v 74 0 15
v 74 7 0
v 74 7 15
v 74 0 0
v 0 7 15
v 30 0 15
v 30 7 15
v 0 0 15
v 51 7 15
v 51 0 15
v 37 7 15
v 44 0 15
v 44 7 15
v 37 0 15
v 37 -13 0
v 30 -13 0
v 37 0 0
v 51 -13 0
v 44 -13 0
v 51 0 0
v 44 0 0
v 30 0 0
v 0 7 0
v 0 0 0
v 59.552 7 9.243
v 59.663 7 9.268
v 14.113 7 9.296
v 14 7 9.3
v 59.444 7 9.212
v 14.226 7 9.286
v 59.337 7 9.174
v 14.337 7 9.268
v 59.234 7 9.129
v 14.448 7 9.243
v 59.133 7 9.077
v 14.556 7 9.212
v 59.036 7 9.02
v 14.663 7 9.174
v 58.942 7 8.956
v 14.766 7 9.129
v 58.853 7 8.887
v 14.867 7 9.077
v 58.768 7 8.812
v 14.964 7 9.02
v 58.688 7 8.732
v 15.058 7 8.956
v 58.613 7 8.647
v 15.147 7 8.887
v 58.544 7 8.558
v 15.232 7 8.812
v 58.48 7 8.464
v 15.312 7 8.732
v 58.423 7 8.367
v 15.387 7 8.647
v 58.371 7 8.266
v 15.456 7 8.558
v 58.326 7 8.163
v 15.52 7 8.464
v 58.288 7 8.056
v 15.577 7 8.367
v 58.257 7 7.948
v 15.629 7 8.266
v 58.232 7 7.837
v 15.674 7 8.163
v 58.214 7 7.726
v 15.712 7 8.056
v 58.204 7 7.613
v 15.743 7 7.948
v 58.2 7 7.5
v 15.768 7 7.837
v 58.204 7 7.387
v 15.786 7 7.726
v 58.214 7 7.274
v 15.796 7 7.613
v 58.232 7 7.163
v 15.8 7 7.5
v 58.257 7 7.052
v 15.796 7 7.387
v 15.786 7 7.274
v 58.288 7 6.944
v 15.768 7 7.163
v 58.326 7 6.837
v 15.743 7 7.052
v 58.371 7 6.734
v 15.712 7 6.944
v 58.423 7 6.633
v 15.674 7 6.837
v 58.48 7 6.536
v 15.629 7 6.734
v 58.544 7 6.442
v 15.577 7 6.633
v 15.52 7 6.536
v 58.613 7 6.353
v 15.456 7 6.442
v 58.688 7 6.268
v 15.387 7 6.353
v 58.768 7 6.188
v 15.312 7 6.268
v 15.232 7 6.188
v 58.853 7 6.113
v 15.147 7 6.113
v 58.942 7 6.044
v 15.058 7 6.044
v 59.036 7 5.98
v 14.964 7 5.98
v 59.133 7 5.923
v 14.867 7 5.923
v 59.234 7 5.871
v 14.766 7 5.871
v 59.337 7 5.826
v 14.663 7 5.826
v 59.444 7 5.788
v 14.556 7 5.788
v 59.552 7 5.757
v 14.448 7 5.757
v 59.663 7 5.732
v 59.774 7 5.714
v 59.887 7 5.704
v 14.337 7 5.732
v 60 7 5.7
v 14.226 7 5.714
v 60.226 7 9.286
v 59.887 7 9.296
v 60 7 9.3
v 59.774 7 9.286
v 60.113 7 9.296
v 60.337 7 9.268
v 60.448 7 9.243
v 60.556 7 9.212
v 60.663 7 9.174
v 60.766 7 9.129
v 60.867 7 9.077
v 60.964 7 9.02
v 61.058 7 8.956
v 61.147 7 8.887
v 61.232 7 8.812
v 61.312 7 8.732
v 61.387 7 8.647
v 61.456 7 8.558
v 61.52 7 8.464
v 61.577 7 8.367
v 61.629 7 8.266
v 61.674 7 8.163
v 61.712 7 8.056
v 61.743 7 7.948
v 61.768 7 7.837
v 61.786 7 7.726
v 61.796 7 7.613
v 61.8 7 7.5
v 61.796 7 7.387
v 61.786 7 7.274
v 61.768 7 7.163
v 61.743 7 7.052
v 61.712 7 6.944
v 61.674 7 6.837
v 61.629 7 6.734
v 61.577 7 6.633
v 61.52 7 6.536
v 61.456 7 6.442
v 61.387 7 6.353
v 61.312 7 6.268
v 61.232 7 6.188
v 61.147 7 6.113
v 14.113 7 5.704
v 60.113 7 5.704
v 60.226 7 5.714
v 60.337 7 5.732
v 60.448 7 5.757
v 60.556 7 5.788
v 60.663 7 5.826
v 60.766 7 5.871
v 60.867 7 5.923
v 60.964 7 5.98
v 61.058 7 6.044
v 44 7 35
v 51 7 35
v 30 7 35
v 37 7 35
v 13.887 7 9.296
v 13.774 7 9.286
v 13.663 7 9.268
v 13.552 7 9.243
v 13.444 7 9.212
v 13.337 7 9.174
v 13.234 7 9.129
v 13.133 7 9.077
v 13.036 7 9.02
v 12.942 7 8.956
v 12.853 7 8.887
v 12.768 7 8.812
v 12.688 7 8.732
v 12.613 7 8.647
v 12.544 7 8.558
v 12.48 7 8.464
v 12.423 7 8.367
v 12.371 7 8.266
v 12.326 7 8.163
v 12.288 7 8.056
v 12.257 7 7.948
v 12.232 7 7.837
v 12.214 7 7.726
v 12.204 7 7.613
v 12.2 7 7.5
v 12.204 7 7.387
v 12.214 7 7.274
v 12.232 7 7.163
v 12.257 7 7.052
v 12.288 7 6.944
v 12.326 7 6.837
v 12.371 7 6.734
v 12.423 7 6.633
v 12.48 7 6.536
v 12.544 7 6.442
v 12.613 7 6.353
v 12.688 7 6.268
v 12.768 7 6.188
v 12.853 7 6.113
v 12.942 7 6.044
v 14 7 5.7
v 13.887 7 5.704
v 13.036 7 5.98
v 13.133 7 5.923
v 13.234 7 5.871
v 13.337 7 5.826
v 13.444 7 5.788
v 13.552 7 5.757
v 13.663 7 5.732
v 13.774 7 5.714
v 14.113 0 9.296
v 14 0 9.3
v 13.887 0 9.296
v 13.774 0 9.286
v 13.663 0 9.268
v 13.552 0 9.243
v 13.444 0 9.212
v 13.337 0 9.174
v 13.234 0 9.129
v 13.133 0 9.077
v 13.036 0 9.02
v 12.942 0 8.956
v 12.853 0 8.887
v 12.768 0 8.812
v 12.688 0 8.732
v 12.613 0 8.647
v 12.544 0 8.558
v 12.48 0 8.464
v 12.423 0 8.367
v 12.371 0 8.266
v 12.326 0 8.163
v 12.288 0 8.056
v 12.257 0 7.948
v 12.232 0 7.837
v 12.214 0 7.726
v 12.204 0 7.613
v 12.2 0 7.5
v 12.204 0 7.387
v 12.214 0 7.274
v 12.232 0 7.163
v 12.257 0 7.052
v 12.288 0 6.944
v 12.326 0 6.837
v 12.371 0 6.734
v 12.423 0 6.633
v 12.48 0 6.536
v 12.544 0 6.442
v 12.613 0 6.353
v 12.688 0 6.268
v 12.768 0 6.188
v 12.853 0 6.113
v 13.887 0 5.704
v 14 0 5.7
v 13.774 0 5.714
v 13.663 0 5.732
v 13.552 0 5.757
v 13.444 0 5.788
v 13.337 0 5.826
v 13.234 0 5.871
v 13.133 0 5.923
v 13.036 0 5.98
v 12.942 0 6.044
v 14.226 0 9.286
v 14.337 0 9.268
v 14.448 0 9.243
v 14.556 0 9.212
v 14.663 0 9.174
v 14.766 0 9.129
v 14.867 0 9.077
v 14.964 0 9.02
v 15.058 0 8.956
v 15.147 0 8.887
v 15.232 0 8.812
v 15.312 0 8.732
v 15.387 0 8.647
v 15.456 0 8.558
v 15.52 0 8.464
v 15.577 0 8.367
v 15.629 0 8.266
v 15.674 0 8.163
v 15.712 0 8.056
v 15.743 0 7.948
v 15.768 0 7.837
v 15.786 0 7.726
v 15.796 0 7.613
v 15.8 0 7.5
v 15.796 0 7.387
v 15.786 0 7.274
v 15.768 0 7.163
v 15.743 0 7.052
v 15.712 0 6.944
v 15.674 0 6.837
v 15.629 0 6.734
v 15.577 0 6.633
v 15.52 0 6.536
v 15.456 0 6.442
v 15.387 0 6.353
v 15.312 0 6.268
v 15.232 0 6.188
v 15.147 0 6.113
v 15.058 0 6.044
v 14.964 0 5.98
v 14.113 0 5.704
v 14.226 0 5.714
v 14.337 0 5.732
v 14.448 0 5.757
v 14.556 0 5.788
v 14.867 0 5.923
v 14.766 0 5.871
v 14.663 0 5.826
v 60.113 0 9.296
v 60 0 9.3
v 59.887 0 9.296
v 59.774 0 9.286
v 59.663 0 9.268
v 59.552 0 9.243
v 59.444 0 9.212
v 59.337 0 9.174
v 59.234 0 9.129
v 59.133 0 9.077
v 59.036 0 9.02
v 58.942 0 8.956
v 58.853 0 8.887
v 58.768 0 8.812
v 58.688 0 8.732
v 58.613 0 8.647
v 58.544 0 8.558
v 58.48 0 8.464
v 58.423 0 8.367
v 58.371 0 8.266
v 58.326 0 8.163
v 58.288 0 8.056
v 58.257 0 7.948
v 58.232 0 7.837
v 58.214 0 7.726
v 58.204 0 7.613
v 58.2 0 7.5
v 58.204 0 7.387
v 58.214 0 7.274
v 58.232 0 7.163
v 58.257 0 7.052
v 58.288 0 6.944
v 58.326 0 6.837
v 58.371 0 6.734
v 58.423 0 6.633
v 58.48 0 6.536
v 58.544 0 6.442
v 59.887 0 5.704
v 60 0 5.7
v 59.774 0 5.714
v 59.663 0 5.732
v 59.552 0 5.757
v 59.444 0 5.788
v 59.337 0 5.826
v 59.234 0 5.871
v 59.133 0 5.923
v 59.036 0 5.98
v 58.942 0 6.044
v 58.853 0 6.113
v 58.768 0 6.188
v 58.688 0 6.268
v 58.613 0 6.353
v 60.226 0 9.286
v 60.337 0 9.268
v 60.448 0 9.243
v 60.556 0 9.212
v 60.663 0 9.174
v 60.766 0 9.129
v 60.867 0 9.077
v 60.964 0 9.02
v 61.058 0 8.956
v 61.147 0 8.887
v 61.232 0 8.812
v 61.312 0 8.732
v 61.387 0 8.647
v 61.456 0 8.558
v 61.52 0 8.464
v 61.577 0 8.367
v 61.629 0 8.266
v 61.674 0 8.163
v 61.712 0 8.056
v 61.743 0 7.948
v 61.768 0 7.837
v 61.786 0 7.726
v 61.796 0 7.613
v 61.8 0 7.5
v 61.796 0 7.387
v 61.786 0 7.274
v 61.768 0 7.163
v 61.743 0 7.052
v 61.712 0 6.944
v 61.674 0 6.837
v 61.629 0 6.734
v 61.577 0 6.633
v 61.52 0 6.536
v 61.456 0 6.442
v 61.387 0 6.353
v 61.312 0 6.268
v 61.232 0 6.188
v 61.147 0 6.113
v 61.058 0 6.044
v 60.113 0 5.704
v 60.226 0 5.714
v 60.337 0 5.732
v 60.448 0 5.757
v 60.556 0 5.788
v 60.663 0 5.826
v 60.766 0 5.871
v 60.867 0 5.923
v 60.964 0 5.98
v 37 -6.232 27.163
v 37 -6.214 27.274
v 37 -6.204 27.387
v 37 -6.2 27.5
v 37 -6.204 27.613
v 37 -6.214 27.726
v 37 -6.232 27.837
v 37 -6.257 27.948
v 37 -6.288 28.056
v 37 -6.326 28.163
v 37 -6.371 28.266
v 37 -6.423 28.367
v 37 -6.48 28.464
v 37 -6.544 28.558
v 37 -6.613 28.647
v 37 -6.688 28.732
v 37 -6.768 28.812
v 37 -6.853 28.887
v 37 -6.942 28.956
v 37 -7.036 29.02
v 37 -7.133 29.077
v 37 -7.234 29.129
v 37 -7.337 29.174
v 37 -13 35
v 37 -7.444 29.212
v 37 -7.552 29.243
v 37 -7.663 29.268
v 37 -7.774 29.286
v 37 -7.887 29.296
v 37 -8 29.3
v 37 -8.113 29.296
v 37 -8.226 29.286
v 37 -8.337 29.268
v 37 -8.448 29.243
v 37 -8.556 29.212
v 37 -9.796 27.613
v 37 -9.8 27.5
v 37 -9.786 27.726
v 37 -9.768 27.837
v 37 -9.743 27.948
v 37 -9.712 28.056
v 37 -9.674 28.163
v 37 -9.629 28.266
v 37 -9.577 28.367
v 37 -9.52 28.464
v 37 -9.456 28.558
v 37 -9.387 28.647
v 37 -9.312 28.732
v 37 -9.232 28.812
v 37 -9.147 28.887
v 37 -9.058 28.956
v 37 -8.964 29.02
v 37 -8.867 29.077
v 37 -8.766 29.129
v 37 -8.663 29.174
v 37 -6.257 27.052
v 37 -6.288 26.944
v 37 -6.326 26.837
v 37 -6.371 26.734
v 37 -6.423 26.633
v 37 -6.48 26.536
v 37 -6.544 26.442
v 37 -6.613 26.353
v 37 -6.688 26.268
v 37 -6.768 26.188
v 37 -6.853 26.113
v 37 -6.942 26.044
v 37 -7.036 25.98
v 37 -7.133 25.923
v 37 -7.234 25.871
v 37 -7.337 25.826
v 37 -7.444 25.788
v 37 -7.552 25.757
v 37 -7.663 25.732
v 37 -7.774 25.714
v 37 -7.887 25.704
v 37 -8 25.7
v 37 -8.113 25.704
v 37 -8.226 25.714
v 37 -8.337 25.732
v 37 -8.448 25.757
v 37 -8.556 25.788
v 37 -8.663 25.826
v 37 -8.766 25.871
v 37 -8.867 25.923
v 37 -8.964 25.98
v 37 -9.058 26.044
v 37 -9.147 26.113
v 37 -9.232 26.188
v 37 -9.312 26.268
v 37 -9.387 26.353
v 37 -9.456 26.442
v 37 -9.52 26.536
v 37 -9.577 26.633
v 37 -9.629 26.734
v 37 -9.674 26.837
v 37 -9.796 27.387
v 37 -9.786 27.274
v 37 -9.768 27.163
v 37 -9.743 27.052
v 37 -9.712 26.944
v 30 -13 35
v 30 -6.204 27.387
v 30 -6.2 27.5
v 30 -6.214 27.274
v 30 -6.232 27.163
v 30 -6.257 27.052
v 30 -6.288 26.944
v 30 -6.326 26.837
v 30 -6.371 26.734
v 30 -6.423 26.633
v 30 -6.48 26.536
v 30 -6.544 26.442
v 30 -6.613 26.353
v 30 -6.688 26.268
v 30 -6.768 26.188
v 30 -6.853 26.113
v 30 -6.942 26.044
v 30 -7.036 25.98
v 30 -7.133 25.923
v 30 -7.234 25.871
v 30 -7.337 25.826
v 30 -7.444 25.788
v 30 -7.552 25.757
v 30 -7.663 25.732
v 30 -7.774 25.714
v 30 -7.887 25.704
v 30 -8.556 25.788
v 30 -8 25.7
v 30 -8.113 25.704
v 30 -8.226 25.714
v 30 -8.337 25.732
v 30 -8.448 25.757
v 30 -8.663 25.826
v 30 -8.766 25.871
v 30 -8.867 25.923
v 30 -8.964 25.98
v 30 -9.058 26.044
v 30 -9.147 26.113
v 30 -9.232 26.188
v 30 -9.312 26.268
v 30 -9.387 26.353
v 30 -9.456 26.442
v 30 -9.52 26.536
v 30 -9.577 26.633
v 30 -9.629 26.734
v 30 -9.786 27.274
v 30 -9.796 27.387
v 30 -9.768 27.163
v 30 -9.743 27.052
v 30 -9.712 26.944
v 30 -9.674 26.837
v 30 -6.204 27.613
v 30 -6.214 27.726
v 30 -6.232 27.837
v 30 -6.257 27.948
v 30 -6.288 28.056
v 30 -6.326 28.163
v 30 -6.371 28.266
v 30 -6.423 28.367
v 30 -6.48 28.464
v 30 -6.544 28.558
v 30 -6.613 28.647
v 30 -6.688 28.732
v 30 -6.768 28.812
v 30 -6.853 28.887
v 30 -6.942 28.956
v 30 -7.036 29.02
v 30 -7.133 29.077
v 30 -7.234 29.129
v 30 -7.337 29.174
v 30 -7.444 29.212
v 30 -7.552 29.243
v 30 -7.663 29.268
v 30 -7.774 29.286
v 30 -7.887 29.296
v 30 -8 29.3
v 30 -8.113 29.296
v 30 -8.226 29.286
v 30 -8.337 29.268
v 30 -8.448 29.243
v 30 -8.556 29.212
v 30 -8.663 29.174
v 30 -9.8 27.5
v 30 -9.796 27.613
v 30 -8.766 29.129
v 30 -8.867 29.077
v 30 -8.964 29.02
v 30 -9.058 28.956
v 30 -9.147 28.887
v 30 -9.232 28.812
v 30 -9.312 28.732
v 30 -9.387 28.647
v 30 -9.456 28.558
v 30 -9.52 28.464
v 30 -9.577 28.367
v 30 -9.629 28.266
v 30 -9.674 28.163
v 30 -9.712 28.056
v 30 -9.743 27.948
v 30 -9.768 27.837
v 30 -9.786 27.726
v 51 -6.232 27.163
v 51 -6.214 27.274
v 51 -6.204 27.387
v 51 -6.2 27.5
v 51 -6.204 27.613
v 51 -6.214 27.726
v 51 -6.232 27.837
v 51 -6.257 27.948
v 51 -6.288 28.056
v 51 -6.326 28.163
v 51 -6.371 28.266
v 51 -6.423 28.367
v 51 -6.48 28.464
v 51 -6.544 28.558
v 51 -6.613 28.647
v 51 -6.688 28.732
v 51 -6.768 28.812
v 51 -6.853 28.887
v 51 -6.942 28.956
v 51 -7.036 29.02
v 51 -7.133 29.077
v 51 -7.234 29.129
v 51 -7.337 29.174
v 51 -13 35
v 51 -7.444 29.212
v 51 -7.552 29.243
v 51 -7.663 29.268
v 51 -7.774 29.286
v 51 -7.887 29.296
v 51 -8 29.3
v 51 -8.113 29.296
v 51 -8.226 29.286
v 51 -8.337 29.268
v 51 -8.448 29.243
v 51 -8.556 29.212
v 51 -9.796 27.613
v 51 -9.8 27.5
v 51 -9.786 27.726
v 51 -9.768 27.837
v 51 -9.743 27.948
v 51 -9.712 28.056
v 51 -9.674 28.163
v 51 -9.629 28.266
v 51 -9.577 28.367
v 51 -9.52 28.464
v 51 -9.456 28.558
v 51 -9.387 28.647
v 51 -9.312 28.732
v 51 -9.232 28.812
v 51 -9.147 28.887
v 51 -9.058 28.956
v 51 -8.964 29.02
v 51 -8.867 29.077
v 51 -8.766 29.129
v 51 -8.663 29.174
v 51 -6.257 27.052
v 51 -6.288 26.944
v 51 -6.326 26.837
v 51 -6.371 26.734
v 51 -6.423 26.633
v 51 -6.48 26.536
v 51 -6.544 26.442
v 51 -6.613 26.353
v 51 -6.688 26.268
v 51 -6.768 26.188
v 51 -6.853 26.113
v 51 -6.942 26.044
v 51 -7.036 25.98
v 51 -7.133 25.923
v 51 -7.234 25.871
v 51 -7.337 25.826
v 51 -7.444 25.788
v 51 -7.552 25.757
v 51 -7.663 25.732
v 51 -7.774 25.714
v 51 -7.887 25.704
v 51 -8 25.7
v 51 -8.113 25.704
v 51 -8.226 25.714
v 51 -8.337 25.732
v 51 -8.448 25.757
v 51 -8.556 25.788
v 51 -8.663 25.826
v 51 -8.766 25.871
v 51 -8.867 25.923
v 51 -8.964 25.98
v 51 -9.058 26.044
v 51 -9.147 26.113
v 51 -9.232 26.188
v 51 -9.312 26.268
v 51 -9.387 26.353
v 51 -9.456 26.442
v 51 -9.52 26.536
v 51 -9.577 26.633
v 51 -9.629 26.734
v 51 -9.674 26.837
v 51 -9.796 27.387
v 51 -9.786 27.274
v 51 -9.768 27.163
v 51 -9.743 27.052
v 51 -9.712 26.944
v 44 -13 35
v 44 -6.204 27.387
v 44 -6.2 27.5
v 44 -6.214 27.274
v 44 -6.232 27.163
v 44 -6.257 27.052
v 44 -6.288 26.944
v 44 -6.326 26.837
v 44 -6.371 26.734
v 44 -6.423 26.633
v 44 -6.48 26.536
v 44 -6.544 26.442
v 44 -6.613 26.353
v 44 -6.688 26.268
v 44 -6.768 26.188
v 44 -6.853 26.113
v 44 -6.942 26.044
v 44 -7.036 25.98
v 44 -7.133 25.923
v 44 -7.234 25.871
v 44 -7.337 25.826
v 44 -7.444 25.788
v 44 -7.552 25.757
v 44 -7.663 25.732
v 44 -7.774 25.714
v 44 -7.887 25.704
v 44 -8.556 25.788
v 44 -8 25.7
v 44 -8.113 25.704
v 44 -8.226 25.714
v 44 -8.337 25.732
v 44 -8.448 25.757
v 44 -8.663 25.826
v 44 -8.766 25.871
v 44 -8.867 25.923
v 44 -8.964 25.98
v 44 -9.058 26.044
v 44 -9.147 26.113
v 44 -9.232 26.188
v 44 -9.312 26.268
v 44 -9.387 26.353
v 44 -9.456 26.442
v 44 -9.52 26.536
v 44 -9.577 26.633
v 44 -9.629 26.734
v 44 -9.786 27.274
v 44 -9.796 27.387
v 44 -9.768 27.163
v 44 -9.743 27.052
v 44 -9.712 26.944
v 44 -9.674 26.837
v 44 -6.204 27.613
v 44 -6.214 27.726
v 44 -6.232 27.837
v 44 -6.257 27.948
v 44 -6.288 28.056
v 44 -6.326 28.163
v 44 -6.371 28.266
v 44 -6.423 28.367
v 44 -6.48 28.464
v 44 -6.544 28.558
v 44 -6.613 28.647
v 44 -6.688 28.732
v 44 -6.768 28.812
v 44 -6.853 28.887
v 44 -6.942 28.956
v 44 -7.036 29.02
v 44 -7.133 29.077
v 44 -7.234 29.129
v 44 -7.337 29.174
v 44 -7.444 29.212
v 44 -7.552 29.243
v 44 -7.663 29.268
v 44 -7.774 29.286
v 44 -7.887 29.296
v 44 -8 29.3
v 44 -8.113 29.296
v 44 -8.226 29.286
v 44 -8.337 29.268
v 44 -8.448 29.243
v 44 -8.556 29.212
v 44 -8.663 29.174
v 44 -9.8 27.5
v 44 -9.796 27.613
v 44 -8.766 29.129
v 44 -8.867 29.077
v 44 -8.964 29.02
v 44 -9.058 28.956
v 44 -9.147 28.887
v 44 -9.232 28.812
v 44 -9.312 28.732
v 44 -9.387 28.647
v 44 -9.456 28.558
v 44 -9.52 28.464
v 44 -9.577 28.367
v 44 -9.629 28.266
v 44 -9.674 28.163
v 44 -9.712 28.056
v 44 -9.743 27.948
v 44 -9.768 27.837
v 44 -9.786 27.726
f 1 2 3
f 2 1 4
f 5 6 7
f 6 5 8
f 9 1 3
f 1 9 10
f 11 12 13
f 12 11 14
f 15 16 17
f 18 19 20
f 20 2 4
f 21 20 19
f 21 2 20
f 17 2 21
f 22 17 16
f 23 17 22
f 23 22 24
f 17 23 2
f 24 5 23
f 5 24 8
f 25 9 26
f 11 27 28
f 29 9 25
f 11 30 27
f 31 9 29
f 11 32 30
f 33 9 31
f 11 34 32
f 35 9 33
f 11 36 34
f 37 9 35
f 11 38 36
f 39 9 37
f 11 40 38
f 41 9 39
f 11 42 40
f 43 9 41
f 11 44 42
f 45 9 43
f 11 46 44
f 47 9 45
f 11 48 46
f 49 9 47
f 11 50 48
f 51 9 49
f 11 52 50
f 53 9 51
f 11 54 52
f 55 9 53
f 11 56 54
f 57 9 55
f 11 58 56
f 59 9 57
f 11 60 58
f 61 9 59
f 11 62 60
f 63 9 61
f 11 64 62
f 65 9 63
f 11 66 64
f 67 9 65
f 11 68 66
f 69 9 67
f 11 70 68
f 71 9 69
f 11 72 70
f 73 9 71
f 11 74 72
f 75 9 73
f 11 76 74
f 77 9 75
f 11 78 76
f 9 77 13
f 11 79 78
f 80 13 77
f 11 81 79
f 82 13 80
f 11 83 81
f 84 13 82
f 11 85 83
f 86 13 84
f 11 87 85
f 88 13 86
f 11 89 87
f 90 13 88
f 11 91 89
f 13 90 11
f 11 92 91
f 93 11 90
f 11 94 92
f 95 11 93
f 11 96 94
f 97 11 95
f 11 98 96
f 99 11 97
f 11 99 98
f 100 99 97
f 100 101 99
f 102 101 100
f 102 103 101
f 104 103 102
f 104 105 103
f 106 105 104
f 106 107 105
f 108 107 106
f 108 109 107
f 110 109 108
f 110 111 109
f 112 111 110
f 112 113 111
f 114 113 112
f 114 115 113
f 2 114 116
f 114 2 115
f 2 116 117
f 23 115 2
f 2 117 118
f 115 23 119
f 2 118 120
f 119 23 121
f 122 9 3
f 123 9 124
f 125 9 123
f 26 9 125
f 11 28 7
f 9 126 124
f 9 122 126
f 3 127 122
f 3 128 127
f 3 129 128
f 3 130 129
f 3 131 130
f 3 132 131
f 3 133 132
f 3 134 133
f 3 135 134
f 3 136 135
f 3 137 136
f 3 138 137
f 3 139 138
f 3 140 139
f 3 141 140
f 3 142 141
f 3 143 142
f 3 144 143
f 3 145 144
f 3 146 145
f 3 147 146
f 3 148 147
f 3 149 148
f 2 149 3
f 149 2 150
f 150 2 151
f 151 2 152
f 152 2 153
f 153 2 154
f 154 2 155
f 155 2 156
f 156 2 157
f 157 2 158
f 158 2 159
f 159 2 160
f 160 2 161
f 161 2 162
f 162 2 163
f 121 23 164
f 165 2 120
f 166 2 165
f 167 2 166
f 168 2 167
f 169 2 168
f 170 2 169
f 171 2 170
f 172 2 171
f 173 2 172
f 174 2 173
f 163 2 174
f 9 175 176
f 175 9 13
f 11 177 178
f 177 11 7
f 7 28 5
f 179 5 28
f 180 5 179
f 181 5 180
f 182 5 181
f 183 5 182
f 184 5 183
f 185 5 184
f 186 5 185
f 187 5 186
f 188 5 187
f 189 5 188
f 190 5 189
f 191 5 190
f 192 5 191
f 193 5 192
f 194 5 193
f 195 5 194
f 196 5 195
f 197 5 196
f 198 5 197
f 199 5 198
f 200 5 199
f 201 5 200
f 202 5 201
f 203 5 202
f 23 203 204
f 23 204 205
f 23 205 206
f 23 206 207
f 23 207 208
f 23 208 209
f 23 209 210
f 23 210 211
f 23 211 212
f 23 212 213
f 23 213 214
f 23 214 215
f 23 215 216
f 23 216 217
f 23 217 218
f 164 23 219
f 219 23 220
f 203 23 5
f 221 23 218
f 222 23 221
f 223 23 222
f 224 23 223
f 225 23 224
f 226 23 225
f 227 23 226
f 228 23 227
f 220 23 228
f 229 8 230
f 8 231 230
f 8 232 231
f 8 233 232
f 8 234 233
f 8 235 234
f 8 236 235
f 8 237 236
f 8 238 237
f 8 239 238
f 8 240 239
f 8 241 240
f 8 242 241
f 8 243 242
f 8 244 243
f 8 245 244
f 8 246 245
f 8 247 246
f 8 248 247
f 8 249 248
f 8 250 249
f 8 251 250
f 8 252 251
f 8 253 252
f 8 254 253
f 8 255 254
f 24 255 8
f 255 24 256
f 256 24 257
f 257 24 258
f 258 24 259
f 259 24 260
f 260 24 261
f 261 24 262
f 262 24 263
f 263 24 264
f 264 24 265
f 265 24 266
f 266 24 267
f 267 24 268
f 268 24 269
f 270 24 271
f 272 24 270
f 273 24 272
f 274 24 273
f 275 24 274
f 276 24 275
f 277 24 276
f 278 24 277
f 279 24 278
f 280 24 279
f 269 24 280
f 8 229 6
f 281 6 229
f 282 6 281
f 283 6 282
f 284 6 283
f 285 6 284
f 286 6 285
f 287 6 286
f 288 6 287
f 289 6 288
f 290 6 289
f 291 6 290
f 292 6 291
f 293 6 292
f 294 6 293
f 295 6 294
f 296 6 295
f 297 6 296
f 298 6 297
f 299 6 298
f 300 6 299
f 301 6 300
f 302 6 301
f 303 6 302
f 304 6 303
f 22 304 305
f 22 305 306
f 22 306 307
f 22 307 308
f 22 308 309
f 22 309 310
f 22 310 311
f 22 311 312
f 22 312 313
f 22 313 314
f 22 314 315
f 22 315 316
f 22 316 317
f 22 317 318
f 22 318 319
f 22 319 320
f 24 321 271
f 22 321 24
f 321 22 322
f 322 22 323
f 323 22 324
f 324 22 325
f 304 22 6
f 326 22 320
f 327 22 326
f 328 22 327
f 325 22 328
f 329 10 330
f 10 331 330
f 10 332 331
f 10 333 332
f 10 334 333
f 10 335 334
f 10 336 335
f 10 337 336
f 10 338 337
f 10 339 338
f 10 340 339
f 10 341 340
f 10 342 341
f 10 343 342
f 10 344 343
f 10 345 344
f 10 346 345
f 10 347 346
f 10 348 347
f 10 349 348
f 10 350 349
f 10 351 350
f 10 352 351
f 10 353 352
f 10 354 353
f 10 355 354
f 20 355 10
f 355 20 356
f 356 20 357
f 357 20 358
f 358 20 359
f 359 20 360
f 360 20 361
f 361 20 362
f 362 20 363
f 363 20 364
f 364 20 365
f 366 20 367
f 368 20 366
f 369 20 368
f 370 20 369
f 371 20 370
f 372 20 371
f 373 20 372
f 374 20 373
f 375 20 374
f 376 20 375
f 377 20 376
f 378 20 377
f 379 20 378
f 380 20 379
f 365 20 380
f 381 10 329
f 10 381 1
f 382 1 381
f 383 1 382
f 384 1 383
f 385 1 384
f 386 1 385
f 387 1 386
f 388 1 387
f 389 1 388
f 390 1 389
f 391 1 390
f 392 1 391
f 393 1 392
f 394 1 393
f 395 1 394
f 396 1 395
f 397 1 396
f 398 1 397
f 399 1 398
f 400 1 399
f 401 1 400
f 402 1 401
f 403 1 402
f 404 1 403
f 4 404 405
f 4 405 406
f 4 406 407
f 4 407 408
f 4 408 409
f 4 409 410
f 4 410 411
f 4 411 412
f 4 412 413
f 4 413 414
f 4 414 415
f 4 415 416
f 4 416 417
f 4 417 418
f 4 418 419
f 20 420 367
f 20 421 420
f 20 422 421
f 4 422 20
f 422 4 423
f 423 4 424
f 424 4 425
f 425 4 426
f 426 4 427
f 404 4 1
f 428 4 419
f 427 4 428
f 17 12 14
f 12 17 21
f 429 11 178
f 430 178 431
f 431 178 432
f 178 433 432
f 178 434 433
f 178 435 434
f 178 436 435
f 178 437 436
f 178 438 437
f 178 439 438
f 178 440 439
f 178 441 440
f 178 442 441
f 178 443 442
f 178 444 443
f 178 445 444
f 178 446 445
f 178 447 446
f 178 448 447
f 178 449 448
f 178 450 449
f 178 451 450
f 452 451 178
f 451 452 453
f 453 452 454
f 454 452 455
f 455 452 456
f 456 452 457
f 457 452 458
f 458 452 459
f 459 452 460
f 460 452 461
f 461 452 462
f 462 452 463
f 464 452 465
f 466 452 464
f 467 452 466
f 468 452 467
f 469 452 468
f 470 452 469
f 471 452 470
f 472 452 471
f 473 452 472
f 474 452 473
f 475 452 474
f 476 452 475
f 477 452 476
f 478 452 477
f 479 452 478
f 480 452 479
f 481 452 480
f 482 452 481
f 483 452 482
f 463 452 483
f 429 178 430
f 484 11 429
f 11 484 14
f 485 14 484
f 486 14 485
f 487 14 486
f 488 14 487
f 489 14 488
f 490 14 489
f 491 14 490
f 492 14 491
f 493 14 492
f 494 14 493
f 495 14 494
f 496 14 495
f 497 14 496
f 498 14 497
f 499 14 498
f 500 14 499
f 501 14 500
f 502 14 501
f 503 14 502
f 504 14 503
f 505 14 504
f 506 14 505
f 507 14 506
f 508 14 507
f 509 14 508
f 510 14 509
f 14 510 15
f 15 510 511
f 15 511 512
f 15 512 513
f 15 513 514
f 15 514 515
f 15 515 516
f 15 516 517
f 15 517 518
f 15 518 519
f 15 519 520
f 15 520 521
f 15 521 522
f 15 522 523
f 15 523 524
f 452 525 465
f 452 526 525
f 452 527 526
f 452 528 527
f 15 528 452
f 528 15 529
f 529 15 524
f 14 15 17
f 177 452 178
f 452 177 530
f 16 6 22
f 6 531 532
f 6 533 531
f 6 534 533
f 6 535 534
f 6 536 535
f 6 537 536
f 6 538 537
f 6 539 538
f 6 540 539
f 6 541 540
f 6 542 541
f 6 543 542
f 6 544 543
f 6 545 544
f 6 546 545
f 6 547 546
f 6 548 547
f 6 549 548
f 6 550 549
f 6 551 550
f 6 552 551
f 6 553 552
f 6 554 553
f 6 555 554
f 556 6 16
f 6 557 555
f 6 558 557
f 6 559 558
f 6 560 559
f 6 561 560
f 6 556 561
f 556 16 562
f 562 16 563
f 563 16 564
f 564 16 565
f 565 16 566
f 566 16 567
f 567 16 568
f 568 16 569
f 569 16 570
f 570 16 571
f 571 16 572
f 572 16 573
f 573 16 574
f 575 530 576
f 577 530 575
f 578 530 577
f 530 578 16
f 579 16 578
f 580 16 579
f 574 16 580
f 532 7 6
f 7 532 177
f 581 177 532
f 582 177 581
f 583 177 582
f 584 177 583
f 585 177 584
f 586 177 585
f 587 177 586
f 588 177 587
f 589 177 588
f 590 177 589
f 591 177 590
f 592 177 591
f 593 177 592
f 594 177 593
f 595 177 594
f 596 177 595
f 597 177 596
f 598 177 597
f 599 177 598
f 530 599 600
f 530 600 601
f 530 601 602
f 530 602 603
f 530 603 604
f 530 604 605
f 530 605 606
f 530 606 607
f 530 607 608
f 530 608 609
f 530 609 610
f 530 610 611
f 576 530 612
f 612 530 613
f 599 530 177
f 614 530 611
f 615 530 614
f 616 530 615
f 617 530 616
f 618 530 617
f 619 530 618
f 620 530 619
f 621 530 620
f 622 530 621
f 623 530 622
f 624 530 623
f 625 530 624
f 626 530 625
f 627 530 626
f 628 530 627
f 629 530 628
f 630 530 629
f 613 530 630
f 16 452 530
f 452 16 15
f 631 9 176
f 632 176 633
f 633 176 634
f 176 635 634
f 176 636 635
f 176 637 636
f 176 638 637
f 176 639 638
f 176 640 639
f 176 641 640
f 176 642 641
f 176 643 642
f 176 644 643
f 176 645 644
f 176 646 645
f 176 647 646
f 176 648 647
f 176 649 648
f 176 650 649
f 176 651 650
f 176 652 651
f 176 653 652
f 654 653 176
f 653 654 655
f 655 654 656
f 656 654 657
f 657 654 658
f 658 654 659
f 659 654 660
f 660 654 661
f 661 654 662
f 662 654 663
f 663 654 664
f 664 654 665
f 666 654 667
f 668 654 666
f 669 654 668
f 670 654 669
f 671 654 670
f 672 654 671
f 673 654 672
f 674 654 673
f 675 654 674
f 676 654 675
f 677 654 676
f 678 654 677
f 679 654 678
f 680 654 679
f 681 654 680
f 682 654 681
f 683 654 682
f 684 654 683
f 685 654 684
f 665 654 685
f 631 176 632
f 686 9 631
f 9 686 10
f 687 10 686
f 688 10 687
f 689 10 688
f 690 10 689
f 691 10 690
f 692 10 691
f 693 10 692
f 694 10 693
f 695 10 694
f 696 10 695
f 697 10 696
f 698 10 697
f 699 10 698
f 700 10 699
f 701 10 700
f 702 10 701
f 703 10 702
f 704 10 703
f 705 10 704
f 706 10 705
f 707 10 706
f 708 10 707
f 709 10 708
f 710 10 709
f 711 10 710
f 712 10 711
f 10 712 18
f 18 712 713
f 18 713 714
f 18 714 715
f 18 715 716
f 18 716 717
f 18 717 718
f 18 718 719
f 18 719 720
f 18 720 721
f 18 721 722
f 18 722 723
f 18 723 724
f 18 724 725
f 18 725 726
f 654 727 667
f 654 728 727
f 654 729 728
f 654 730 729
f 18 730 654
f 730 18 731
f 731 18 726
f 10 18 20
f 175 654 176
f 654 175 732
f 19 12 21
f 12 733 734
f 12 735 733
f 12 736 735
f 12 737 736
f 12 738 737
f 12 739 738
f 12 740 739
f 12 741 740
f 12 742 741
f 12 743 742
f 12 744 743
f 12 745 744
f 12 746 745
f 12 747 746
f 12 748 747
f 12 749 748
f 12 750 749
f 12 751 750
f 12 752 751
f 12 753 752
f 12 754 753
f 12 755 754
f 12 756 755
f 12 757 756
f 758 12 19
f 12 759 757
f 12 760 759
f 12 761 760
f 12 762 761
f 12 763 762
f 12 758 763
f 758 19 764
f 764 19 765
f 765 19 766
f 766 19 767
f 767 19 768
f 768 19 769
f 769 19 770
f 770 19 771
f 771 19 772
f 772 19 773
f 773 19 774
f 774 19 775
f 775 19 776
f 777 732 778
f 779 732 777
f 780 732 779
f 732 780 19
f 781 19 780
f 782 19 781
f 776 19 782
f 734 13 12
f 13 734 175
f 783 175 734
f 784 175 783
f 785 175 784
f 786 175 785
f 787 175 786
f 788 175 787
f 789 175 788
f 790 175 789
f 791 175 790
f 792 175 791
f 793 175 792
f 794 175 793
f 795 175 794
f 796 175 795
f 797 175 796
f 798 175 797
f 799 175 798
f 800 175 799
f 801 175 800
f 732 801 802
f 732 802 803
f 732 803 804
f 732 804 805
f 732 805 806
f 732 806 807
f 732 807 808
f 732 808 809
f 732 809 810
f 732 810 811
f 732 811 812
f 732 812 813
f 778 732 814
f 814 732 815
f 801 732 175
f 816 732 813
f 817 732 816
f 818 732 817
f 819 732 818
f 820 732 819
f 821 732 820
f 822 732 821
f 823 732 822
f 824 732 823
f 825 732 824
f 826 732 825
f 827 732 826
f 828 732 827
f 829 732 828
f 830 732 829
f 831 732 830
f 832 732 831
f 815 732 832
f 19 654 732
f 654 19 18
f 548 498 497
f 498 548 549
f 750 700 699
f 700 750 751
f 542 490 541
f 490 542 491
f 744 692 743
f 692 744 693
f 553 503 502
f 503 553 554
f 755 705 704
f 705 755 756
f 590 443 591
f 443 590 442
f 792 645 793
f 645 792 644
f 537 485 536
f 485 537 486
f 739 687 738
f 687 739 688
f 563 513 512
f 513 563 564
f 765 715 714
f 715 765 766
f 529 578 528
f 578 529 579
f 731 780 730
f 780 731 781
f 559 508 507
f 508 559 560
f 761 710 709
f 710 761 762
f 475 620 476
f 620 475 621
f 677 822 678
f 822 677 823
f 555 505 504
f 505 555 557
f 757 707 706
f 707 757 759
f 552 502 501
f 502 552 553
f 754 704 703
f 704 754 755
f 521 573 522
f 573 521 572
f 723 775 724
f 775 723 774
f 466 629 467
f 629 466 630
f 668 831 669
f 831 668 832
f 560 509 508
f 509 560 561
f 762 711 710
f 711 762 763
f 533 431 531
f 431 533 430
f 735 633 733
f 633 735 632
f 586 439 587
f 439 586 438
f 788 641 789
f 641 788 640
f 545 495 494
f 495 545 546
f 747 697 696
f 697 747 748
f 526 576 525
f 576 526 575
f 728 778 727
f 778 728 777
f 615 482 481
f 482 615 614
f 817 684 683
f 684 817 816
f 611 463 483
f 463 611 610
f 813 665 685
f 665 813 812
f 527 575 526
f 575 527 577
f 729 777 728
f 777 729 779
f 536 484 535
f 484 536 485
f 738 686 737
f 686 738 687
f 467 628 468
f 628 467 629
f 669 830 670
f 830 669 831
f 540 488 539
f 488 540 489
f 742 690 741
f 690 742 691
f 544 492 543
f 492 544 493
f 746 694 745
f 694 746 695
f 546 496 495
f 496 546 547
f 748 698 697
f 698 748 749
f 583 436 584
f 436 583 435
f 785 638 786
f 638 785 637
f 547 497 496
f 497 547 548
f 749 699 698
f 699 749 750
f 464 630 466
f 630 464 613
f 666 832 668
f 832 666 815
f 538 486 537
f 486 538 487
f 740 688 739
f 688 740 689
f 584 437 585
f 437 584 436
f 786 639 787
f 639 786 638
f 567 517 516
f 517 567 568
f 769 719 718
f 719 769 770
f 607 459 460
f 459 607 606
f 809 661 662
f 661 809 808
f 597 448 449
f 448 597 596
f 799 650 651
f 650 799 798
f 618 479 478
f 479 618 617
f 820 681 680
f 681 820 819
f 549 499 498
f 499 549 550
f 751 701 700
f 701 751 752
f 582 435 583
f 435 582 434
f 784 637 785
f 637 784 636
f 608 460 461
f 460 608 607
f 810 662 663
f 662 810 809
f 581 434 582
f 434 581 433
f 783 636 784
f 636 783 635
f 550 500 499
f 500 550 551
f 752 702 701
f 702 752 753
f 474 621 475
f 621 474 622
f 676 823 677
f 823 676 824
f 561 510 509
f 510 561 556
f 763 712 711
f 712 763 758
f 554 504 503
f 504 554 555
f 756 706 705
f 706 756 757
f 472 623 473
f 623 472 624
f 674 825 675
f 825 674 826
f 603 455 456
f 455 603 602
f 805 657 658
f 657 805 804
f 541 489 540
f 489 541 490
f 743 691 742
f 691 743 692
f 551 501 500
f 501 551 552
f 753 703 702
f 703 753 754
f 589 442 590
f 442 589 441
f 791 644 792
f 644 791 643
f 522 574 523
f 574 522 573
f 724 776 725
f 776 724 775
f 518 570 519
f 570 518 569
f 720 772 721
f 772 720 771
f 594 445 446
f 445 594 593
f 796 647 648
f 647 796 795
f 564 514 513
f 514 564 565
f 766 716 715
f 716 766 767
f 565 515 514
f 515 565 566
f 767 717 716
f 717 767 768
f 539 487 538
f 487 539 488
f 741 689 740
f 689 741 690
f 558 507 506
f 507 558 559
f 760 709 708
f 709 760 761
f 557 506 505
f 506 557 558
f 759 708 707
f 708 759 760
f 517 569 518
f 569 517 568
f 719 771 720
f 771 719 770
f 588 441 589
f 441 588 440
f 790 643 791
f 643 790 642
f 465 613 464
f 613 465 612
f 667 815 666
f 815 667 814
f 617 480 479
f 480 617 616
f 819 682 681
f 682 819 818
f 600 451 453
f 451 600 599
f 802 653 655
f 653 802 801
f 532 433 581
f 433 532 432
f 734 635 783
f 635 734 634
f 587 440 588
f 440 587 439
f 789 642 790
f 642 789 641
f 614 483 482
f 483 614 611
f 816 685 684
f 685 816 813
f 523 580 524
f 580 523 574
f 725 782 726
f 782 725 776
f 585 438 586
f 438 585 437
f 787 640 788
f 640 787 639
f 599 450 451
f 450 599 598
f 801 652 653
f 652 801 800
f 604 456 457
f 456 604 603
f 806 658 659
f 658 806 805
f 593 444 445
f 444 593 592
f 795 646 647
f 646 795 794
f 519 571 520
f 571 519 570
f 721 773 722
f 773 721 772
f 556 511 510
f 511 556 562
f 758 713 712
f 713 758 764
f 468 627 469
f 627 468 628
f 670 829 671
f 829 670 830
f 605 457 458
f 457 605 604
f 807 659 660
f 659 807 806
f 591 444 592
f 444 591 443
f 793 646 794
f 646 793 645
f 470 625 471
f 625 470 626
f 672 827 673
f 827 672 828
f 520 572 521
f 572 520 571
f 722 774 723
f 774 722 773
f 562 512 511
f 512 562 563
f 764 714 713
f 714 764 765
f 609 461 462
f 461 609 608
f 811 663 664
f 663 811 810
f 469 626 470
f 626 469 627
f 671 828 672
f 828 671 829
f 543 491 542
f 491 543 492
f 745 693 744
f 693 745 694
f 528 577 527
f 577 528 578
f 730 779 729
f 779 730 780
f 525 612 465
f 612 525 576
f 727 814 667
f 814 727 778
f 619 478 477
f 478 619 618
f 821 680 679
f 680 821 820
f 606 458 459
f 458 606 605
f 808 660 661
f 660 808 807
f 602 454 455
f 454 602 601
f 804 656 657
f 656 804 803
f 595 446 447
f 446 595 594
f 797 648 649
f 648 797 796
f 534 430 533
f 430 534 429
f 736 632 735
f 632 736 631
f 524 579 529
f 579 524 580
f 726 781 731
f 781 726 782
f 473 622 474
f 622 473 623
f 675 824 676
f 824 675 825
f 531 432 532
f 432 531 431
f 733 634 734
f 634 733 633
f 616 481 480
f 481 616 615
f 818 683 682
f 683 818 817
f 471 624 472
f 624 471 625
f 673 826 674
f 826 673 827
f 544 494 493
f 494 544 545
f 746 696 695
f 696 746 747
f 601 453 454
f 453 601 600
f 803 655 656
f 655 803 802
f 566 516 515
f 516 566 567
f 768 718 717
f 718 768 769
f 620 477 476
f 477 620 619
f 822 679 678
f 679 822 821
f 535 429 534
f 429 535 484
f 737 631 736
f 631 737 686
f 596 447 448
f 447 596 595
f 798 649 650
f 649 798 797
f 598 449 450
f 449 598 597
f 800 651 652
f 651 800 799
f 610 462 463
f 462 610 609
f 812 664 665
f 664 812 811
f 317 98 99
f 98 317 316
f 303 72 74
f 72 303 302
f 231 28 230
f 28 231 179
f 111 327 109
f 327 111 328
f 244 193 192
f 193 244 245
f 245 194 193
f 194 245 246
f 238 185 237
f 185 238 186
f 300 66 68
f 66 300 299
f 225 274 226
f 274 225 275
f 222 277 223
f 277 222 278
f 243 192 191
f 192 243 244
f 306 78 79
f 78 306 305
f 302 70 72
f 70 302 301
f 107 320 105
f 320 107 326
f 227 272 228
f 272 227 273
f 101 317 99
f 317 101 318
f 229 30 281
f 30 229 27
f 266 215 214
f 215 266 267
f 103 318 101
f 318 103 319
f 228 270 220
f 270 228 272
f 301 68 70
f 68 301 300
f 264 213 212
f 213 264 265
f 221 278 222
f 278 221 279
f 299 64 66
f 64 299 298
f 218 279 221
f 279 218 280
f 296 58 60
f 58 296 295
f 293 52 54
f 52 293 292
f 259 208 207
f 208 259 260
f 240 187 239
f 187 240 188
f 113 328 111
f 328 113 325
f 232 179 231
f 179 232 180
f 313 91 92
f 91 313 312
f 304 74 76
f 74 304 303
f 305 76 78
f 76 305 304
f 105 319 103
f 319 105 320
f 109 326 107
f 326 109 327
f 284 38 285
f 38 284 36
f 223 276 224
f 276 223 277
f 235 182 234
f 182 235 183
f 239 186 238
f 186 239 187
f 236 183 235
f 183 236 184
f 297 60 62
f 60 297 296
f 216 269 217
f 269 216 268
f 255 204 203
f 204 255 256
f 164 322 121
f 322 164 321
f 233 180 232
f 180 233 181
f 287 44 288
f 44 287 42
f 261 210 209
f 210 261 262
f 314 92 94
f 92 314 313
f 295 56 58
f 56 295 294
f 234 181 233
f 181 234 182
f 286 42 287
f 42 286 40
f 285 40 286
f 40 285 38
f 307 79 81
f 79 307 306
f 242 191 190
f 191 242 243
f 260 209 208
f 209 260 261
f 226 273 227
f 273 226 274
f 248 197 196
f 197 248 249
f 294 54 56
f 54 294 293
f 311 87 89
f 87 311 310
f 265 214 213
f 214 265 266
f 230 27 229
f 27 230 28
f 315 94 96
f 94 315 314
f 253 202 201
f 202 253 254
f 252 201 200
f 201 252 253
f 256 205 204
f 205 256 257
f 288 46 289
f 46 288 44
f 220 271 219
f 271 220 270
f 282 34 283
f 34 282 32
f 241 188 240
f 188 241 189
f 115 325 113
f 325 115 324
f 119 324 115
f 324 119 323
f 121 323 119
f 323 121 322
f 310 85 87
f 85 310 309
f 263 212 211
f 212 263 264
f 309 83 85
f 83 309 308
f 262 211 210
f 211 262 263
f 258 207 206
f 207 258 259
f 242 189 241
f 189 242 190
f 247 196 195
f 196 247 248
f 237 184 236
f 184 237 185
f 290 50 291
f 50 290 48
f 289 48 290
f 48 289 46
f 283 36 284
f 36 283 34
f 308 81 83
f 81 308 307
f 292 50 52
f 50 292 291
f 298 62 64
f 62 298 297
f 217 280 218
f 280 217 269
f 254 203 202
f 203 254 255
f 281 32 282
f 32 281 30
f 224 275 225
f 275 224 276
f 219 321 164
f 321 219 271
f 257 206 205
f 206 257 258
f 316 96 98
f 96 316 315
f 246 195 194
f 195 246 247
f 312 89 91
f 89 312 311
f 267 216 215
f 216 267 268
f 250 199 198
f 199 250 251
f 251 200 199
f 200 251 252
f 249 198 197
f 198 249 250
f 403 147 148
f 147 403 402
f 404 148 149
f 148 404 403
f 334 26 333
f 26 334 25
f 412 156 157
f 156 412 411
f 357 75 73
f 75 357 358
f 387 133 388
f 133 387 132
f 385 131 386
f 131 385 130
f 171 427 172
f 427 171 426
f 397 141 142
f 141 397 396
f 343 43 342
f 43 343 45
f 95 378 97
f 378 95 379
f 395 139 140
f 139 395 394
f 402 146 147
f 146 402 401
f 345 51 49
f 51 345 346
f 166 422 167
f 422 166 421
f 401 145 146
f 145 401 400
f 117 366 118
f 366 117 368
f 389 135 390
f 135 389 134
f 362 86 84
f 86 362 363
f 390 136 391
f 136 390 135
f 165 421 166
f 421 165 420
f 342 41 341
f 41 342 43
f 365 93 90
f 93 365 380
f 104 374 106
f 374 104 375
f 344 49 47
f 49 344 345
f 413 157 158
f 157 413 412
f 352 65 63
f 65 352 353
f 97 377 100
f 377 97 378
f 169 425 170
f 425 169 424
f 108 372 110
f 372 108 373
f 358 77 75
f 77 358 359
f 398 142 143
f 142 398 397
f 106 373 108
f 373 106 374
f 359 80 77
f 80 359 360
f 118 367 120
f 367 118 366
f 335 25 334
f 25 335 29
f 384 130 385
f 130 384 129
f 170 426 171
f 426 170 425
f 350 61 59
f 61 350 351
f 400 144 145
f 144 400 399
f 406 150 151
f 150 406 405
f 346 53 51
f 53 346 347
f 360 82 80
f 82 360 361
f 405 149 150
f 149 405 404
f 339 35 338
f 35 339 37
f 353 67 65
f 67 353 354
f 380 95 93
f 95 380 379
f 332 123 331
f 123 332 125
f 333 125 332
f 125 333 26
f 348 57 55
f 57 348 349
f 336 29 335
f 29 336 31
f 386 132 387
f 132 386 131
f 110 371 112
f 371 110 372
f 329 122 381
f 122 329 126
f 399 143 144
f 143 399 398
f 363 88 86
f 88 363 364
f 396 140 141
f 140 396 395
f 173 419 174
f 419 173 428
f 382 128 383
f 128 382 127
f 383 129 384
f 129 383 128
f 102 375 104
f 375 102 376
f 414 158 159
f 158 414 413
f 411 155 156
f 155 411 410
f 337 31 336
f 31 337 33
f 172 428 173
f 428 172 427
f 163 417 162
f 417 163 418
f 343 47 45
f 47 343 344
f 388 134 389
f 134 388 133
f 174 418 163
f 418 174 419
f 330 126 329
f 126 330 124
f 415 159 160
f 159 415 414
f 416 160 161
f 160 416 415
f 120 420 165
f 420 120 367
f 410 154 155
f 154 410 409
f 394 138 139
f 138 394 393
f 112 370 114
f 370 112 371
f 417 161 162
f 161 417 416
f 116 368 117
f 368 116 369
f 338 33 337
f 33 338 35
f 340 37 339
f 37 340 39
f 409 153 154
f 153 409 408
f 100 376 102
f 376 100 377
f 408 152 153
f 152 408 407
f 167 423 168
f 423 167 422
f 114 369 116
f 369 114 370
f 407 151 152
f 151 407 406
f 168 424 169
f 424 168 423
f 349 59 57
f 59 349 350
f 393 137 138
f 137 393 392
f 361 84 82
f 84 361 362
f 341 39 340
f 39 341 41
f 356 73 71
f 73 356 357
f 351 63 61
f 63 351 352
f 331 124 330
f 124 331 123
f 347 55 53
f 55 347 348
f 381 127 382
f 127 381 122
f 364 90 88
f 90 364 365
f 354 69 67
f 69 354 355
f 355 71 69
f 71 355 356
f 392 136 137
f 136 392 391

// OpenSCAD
difference(){
	union(){
        
       translate([0,0,0]){
           cube([74,7,15], center=false);
       }
       translate([37-7,-13,0]){
           cube([7,20,35], center=false);
       }
       translate([37+7,-13,0]){
           cube([7,20,35], center=false);
       }


	}
	union() {
       translate([-10,-8, 27.5]){
            rotate(a = [0,90,0]) {
              cylinder(h=600, r=1.8, $fn=100, center=false);
            }
       }

       translate([74/2-23,100,7.5]){
            rotate(a = [90,0,0]) {
              cylinder(h=600, r=1.8, $fn=100, center=false);
            }
       }	
       translate([74/2+23,100,7.5]){
            rotate(a = [90,0,0]) {
              cylinder(h=600, r=1.8, $fn=100, center=false);
            }
       }	
        
	}
}
